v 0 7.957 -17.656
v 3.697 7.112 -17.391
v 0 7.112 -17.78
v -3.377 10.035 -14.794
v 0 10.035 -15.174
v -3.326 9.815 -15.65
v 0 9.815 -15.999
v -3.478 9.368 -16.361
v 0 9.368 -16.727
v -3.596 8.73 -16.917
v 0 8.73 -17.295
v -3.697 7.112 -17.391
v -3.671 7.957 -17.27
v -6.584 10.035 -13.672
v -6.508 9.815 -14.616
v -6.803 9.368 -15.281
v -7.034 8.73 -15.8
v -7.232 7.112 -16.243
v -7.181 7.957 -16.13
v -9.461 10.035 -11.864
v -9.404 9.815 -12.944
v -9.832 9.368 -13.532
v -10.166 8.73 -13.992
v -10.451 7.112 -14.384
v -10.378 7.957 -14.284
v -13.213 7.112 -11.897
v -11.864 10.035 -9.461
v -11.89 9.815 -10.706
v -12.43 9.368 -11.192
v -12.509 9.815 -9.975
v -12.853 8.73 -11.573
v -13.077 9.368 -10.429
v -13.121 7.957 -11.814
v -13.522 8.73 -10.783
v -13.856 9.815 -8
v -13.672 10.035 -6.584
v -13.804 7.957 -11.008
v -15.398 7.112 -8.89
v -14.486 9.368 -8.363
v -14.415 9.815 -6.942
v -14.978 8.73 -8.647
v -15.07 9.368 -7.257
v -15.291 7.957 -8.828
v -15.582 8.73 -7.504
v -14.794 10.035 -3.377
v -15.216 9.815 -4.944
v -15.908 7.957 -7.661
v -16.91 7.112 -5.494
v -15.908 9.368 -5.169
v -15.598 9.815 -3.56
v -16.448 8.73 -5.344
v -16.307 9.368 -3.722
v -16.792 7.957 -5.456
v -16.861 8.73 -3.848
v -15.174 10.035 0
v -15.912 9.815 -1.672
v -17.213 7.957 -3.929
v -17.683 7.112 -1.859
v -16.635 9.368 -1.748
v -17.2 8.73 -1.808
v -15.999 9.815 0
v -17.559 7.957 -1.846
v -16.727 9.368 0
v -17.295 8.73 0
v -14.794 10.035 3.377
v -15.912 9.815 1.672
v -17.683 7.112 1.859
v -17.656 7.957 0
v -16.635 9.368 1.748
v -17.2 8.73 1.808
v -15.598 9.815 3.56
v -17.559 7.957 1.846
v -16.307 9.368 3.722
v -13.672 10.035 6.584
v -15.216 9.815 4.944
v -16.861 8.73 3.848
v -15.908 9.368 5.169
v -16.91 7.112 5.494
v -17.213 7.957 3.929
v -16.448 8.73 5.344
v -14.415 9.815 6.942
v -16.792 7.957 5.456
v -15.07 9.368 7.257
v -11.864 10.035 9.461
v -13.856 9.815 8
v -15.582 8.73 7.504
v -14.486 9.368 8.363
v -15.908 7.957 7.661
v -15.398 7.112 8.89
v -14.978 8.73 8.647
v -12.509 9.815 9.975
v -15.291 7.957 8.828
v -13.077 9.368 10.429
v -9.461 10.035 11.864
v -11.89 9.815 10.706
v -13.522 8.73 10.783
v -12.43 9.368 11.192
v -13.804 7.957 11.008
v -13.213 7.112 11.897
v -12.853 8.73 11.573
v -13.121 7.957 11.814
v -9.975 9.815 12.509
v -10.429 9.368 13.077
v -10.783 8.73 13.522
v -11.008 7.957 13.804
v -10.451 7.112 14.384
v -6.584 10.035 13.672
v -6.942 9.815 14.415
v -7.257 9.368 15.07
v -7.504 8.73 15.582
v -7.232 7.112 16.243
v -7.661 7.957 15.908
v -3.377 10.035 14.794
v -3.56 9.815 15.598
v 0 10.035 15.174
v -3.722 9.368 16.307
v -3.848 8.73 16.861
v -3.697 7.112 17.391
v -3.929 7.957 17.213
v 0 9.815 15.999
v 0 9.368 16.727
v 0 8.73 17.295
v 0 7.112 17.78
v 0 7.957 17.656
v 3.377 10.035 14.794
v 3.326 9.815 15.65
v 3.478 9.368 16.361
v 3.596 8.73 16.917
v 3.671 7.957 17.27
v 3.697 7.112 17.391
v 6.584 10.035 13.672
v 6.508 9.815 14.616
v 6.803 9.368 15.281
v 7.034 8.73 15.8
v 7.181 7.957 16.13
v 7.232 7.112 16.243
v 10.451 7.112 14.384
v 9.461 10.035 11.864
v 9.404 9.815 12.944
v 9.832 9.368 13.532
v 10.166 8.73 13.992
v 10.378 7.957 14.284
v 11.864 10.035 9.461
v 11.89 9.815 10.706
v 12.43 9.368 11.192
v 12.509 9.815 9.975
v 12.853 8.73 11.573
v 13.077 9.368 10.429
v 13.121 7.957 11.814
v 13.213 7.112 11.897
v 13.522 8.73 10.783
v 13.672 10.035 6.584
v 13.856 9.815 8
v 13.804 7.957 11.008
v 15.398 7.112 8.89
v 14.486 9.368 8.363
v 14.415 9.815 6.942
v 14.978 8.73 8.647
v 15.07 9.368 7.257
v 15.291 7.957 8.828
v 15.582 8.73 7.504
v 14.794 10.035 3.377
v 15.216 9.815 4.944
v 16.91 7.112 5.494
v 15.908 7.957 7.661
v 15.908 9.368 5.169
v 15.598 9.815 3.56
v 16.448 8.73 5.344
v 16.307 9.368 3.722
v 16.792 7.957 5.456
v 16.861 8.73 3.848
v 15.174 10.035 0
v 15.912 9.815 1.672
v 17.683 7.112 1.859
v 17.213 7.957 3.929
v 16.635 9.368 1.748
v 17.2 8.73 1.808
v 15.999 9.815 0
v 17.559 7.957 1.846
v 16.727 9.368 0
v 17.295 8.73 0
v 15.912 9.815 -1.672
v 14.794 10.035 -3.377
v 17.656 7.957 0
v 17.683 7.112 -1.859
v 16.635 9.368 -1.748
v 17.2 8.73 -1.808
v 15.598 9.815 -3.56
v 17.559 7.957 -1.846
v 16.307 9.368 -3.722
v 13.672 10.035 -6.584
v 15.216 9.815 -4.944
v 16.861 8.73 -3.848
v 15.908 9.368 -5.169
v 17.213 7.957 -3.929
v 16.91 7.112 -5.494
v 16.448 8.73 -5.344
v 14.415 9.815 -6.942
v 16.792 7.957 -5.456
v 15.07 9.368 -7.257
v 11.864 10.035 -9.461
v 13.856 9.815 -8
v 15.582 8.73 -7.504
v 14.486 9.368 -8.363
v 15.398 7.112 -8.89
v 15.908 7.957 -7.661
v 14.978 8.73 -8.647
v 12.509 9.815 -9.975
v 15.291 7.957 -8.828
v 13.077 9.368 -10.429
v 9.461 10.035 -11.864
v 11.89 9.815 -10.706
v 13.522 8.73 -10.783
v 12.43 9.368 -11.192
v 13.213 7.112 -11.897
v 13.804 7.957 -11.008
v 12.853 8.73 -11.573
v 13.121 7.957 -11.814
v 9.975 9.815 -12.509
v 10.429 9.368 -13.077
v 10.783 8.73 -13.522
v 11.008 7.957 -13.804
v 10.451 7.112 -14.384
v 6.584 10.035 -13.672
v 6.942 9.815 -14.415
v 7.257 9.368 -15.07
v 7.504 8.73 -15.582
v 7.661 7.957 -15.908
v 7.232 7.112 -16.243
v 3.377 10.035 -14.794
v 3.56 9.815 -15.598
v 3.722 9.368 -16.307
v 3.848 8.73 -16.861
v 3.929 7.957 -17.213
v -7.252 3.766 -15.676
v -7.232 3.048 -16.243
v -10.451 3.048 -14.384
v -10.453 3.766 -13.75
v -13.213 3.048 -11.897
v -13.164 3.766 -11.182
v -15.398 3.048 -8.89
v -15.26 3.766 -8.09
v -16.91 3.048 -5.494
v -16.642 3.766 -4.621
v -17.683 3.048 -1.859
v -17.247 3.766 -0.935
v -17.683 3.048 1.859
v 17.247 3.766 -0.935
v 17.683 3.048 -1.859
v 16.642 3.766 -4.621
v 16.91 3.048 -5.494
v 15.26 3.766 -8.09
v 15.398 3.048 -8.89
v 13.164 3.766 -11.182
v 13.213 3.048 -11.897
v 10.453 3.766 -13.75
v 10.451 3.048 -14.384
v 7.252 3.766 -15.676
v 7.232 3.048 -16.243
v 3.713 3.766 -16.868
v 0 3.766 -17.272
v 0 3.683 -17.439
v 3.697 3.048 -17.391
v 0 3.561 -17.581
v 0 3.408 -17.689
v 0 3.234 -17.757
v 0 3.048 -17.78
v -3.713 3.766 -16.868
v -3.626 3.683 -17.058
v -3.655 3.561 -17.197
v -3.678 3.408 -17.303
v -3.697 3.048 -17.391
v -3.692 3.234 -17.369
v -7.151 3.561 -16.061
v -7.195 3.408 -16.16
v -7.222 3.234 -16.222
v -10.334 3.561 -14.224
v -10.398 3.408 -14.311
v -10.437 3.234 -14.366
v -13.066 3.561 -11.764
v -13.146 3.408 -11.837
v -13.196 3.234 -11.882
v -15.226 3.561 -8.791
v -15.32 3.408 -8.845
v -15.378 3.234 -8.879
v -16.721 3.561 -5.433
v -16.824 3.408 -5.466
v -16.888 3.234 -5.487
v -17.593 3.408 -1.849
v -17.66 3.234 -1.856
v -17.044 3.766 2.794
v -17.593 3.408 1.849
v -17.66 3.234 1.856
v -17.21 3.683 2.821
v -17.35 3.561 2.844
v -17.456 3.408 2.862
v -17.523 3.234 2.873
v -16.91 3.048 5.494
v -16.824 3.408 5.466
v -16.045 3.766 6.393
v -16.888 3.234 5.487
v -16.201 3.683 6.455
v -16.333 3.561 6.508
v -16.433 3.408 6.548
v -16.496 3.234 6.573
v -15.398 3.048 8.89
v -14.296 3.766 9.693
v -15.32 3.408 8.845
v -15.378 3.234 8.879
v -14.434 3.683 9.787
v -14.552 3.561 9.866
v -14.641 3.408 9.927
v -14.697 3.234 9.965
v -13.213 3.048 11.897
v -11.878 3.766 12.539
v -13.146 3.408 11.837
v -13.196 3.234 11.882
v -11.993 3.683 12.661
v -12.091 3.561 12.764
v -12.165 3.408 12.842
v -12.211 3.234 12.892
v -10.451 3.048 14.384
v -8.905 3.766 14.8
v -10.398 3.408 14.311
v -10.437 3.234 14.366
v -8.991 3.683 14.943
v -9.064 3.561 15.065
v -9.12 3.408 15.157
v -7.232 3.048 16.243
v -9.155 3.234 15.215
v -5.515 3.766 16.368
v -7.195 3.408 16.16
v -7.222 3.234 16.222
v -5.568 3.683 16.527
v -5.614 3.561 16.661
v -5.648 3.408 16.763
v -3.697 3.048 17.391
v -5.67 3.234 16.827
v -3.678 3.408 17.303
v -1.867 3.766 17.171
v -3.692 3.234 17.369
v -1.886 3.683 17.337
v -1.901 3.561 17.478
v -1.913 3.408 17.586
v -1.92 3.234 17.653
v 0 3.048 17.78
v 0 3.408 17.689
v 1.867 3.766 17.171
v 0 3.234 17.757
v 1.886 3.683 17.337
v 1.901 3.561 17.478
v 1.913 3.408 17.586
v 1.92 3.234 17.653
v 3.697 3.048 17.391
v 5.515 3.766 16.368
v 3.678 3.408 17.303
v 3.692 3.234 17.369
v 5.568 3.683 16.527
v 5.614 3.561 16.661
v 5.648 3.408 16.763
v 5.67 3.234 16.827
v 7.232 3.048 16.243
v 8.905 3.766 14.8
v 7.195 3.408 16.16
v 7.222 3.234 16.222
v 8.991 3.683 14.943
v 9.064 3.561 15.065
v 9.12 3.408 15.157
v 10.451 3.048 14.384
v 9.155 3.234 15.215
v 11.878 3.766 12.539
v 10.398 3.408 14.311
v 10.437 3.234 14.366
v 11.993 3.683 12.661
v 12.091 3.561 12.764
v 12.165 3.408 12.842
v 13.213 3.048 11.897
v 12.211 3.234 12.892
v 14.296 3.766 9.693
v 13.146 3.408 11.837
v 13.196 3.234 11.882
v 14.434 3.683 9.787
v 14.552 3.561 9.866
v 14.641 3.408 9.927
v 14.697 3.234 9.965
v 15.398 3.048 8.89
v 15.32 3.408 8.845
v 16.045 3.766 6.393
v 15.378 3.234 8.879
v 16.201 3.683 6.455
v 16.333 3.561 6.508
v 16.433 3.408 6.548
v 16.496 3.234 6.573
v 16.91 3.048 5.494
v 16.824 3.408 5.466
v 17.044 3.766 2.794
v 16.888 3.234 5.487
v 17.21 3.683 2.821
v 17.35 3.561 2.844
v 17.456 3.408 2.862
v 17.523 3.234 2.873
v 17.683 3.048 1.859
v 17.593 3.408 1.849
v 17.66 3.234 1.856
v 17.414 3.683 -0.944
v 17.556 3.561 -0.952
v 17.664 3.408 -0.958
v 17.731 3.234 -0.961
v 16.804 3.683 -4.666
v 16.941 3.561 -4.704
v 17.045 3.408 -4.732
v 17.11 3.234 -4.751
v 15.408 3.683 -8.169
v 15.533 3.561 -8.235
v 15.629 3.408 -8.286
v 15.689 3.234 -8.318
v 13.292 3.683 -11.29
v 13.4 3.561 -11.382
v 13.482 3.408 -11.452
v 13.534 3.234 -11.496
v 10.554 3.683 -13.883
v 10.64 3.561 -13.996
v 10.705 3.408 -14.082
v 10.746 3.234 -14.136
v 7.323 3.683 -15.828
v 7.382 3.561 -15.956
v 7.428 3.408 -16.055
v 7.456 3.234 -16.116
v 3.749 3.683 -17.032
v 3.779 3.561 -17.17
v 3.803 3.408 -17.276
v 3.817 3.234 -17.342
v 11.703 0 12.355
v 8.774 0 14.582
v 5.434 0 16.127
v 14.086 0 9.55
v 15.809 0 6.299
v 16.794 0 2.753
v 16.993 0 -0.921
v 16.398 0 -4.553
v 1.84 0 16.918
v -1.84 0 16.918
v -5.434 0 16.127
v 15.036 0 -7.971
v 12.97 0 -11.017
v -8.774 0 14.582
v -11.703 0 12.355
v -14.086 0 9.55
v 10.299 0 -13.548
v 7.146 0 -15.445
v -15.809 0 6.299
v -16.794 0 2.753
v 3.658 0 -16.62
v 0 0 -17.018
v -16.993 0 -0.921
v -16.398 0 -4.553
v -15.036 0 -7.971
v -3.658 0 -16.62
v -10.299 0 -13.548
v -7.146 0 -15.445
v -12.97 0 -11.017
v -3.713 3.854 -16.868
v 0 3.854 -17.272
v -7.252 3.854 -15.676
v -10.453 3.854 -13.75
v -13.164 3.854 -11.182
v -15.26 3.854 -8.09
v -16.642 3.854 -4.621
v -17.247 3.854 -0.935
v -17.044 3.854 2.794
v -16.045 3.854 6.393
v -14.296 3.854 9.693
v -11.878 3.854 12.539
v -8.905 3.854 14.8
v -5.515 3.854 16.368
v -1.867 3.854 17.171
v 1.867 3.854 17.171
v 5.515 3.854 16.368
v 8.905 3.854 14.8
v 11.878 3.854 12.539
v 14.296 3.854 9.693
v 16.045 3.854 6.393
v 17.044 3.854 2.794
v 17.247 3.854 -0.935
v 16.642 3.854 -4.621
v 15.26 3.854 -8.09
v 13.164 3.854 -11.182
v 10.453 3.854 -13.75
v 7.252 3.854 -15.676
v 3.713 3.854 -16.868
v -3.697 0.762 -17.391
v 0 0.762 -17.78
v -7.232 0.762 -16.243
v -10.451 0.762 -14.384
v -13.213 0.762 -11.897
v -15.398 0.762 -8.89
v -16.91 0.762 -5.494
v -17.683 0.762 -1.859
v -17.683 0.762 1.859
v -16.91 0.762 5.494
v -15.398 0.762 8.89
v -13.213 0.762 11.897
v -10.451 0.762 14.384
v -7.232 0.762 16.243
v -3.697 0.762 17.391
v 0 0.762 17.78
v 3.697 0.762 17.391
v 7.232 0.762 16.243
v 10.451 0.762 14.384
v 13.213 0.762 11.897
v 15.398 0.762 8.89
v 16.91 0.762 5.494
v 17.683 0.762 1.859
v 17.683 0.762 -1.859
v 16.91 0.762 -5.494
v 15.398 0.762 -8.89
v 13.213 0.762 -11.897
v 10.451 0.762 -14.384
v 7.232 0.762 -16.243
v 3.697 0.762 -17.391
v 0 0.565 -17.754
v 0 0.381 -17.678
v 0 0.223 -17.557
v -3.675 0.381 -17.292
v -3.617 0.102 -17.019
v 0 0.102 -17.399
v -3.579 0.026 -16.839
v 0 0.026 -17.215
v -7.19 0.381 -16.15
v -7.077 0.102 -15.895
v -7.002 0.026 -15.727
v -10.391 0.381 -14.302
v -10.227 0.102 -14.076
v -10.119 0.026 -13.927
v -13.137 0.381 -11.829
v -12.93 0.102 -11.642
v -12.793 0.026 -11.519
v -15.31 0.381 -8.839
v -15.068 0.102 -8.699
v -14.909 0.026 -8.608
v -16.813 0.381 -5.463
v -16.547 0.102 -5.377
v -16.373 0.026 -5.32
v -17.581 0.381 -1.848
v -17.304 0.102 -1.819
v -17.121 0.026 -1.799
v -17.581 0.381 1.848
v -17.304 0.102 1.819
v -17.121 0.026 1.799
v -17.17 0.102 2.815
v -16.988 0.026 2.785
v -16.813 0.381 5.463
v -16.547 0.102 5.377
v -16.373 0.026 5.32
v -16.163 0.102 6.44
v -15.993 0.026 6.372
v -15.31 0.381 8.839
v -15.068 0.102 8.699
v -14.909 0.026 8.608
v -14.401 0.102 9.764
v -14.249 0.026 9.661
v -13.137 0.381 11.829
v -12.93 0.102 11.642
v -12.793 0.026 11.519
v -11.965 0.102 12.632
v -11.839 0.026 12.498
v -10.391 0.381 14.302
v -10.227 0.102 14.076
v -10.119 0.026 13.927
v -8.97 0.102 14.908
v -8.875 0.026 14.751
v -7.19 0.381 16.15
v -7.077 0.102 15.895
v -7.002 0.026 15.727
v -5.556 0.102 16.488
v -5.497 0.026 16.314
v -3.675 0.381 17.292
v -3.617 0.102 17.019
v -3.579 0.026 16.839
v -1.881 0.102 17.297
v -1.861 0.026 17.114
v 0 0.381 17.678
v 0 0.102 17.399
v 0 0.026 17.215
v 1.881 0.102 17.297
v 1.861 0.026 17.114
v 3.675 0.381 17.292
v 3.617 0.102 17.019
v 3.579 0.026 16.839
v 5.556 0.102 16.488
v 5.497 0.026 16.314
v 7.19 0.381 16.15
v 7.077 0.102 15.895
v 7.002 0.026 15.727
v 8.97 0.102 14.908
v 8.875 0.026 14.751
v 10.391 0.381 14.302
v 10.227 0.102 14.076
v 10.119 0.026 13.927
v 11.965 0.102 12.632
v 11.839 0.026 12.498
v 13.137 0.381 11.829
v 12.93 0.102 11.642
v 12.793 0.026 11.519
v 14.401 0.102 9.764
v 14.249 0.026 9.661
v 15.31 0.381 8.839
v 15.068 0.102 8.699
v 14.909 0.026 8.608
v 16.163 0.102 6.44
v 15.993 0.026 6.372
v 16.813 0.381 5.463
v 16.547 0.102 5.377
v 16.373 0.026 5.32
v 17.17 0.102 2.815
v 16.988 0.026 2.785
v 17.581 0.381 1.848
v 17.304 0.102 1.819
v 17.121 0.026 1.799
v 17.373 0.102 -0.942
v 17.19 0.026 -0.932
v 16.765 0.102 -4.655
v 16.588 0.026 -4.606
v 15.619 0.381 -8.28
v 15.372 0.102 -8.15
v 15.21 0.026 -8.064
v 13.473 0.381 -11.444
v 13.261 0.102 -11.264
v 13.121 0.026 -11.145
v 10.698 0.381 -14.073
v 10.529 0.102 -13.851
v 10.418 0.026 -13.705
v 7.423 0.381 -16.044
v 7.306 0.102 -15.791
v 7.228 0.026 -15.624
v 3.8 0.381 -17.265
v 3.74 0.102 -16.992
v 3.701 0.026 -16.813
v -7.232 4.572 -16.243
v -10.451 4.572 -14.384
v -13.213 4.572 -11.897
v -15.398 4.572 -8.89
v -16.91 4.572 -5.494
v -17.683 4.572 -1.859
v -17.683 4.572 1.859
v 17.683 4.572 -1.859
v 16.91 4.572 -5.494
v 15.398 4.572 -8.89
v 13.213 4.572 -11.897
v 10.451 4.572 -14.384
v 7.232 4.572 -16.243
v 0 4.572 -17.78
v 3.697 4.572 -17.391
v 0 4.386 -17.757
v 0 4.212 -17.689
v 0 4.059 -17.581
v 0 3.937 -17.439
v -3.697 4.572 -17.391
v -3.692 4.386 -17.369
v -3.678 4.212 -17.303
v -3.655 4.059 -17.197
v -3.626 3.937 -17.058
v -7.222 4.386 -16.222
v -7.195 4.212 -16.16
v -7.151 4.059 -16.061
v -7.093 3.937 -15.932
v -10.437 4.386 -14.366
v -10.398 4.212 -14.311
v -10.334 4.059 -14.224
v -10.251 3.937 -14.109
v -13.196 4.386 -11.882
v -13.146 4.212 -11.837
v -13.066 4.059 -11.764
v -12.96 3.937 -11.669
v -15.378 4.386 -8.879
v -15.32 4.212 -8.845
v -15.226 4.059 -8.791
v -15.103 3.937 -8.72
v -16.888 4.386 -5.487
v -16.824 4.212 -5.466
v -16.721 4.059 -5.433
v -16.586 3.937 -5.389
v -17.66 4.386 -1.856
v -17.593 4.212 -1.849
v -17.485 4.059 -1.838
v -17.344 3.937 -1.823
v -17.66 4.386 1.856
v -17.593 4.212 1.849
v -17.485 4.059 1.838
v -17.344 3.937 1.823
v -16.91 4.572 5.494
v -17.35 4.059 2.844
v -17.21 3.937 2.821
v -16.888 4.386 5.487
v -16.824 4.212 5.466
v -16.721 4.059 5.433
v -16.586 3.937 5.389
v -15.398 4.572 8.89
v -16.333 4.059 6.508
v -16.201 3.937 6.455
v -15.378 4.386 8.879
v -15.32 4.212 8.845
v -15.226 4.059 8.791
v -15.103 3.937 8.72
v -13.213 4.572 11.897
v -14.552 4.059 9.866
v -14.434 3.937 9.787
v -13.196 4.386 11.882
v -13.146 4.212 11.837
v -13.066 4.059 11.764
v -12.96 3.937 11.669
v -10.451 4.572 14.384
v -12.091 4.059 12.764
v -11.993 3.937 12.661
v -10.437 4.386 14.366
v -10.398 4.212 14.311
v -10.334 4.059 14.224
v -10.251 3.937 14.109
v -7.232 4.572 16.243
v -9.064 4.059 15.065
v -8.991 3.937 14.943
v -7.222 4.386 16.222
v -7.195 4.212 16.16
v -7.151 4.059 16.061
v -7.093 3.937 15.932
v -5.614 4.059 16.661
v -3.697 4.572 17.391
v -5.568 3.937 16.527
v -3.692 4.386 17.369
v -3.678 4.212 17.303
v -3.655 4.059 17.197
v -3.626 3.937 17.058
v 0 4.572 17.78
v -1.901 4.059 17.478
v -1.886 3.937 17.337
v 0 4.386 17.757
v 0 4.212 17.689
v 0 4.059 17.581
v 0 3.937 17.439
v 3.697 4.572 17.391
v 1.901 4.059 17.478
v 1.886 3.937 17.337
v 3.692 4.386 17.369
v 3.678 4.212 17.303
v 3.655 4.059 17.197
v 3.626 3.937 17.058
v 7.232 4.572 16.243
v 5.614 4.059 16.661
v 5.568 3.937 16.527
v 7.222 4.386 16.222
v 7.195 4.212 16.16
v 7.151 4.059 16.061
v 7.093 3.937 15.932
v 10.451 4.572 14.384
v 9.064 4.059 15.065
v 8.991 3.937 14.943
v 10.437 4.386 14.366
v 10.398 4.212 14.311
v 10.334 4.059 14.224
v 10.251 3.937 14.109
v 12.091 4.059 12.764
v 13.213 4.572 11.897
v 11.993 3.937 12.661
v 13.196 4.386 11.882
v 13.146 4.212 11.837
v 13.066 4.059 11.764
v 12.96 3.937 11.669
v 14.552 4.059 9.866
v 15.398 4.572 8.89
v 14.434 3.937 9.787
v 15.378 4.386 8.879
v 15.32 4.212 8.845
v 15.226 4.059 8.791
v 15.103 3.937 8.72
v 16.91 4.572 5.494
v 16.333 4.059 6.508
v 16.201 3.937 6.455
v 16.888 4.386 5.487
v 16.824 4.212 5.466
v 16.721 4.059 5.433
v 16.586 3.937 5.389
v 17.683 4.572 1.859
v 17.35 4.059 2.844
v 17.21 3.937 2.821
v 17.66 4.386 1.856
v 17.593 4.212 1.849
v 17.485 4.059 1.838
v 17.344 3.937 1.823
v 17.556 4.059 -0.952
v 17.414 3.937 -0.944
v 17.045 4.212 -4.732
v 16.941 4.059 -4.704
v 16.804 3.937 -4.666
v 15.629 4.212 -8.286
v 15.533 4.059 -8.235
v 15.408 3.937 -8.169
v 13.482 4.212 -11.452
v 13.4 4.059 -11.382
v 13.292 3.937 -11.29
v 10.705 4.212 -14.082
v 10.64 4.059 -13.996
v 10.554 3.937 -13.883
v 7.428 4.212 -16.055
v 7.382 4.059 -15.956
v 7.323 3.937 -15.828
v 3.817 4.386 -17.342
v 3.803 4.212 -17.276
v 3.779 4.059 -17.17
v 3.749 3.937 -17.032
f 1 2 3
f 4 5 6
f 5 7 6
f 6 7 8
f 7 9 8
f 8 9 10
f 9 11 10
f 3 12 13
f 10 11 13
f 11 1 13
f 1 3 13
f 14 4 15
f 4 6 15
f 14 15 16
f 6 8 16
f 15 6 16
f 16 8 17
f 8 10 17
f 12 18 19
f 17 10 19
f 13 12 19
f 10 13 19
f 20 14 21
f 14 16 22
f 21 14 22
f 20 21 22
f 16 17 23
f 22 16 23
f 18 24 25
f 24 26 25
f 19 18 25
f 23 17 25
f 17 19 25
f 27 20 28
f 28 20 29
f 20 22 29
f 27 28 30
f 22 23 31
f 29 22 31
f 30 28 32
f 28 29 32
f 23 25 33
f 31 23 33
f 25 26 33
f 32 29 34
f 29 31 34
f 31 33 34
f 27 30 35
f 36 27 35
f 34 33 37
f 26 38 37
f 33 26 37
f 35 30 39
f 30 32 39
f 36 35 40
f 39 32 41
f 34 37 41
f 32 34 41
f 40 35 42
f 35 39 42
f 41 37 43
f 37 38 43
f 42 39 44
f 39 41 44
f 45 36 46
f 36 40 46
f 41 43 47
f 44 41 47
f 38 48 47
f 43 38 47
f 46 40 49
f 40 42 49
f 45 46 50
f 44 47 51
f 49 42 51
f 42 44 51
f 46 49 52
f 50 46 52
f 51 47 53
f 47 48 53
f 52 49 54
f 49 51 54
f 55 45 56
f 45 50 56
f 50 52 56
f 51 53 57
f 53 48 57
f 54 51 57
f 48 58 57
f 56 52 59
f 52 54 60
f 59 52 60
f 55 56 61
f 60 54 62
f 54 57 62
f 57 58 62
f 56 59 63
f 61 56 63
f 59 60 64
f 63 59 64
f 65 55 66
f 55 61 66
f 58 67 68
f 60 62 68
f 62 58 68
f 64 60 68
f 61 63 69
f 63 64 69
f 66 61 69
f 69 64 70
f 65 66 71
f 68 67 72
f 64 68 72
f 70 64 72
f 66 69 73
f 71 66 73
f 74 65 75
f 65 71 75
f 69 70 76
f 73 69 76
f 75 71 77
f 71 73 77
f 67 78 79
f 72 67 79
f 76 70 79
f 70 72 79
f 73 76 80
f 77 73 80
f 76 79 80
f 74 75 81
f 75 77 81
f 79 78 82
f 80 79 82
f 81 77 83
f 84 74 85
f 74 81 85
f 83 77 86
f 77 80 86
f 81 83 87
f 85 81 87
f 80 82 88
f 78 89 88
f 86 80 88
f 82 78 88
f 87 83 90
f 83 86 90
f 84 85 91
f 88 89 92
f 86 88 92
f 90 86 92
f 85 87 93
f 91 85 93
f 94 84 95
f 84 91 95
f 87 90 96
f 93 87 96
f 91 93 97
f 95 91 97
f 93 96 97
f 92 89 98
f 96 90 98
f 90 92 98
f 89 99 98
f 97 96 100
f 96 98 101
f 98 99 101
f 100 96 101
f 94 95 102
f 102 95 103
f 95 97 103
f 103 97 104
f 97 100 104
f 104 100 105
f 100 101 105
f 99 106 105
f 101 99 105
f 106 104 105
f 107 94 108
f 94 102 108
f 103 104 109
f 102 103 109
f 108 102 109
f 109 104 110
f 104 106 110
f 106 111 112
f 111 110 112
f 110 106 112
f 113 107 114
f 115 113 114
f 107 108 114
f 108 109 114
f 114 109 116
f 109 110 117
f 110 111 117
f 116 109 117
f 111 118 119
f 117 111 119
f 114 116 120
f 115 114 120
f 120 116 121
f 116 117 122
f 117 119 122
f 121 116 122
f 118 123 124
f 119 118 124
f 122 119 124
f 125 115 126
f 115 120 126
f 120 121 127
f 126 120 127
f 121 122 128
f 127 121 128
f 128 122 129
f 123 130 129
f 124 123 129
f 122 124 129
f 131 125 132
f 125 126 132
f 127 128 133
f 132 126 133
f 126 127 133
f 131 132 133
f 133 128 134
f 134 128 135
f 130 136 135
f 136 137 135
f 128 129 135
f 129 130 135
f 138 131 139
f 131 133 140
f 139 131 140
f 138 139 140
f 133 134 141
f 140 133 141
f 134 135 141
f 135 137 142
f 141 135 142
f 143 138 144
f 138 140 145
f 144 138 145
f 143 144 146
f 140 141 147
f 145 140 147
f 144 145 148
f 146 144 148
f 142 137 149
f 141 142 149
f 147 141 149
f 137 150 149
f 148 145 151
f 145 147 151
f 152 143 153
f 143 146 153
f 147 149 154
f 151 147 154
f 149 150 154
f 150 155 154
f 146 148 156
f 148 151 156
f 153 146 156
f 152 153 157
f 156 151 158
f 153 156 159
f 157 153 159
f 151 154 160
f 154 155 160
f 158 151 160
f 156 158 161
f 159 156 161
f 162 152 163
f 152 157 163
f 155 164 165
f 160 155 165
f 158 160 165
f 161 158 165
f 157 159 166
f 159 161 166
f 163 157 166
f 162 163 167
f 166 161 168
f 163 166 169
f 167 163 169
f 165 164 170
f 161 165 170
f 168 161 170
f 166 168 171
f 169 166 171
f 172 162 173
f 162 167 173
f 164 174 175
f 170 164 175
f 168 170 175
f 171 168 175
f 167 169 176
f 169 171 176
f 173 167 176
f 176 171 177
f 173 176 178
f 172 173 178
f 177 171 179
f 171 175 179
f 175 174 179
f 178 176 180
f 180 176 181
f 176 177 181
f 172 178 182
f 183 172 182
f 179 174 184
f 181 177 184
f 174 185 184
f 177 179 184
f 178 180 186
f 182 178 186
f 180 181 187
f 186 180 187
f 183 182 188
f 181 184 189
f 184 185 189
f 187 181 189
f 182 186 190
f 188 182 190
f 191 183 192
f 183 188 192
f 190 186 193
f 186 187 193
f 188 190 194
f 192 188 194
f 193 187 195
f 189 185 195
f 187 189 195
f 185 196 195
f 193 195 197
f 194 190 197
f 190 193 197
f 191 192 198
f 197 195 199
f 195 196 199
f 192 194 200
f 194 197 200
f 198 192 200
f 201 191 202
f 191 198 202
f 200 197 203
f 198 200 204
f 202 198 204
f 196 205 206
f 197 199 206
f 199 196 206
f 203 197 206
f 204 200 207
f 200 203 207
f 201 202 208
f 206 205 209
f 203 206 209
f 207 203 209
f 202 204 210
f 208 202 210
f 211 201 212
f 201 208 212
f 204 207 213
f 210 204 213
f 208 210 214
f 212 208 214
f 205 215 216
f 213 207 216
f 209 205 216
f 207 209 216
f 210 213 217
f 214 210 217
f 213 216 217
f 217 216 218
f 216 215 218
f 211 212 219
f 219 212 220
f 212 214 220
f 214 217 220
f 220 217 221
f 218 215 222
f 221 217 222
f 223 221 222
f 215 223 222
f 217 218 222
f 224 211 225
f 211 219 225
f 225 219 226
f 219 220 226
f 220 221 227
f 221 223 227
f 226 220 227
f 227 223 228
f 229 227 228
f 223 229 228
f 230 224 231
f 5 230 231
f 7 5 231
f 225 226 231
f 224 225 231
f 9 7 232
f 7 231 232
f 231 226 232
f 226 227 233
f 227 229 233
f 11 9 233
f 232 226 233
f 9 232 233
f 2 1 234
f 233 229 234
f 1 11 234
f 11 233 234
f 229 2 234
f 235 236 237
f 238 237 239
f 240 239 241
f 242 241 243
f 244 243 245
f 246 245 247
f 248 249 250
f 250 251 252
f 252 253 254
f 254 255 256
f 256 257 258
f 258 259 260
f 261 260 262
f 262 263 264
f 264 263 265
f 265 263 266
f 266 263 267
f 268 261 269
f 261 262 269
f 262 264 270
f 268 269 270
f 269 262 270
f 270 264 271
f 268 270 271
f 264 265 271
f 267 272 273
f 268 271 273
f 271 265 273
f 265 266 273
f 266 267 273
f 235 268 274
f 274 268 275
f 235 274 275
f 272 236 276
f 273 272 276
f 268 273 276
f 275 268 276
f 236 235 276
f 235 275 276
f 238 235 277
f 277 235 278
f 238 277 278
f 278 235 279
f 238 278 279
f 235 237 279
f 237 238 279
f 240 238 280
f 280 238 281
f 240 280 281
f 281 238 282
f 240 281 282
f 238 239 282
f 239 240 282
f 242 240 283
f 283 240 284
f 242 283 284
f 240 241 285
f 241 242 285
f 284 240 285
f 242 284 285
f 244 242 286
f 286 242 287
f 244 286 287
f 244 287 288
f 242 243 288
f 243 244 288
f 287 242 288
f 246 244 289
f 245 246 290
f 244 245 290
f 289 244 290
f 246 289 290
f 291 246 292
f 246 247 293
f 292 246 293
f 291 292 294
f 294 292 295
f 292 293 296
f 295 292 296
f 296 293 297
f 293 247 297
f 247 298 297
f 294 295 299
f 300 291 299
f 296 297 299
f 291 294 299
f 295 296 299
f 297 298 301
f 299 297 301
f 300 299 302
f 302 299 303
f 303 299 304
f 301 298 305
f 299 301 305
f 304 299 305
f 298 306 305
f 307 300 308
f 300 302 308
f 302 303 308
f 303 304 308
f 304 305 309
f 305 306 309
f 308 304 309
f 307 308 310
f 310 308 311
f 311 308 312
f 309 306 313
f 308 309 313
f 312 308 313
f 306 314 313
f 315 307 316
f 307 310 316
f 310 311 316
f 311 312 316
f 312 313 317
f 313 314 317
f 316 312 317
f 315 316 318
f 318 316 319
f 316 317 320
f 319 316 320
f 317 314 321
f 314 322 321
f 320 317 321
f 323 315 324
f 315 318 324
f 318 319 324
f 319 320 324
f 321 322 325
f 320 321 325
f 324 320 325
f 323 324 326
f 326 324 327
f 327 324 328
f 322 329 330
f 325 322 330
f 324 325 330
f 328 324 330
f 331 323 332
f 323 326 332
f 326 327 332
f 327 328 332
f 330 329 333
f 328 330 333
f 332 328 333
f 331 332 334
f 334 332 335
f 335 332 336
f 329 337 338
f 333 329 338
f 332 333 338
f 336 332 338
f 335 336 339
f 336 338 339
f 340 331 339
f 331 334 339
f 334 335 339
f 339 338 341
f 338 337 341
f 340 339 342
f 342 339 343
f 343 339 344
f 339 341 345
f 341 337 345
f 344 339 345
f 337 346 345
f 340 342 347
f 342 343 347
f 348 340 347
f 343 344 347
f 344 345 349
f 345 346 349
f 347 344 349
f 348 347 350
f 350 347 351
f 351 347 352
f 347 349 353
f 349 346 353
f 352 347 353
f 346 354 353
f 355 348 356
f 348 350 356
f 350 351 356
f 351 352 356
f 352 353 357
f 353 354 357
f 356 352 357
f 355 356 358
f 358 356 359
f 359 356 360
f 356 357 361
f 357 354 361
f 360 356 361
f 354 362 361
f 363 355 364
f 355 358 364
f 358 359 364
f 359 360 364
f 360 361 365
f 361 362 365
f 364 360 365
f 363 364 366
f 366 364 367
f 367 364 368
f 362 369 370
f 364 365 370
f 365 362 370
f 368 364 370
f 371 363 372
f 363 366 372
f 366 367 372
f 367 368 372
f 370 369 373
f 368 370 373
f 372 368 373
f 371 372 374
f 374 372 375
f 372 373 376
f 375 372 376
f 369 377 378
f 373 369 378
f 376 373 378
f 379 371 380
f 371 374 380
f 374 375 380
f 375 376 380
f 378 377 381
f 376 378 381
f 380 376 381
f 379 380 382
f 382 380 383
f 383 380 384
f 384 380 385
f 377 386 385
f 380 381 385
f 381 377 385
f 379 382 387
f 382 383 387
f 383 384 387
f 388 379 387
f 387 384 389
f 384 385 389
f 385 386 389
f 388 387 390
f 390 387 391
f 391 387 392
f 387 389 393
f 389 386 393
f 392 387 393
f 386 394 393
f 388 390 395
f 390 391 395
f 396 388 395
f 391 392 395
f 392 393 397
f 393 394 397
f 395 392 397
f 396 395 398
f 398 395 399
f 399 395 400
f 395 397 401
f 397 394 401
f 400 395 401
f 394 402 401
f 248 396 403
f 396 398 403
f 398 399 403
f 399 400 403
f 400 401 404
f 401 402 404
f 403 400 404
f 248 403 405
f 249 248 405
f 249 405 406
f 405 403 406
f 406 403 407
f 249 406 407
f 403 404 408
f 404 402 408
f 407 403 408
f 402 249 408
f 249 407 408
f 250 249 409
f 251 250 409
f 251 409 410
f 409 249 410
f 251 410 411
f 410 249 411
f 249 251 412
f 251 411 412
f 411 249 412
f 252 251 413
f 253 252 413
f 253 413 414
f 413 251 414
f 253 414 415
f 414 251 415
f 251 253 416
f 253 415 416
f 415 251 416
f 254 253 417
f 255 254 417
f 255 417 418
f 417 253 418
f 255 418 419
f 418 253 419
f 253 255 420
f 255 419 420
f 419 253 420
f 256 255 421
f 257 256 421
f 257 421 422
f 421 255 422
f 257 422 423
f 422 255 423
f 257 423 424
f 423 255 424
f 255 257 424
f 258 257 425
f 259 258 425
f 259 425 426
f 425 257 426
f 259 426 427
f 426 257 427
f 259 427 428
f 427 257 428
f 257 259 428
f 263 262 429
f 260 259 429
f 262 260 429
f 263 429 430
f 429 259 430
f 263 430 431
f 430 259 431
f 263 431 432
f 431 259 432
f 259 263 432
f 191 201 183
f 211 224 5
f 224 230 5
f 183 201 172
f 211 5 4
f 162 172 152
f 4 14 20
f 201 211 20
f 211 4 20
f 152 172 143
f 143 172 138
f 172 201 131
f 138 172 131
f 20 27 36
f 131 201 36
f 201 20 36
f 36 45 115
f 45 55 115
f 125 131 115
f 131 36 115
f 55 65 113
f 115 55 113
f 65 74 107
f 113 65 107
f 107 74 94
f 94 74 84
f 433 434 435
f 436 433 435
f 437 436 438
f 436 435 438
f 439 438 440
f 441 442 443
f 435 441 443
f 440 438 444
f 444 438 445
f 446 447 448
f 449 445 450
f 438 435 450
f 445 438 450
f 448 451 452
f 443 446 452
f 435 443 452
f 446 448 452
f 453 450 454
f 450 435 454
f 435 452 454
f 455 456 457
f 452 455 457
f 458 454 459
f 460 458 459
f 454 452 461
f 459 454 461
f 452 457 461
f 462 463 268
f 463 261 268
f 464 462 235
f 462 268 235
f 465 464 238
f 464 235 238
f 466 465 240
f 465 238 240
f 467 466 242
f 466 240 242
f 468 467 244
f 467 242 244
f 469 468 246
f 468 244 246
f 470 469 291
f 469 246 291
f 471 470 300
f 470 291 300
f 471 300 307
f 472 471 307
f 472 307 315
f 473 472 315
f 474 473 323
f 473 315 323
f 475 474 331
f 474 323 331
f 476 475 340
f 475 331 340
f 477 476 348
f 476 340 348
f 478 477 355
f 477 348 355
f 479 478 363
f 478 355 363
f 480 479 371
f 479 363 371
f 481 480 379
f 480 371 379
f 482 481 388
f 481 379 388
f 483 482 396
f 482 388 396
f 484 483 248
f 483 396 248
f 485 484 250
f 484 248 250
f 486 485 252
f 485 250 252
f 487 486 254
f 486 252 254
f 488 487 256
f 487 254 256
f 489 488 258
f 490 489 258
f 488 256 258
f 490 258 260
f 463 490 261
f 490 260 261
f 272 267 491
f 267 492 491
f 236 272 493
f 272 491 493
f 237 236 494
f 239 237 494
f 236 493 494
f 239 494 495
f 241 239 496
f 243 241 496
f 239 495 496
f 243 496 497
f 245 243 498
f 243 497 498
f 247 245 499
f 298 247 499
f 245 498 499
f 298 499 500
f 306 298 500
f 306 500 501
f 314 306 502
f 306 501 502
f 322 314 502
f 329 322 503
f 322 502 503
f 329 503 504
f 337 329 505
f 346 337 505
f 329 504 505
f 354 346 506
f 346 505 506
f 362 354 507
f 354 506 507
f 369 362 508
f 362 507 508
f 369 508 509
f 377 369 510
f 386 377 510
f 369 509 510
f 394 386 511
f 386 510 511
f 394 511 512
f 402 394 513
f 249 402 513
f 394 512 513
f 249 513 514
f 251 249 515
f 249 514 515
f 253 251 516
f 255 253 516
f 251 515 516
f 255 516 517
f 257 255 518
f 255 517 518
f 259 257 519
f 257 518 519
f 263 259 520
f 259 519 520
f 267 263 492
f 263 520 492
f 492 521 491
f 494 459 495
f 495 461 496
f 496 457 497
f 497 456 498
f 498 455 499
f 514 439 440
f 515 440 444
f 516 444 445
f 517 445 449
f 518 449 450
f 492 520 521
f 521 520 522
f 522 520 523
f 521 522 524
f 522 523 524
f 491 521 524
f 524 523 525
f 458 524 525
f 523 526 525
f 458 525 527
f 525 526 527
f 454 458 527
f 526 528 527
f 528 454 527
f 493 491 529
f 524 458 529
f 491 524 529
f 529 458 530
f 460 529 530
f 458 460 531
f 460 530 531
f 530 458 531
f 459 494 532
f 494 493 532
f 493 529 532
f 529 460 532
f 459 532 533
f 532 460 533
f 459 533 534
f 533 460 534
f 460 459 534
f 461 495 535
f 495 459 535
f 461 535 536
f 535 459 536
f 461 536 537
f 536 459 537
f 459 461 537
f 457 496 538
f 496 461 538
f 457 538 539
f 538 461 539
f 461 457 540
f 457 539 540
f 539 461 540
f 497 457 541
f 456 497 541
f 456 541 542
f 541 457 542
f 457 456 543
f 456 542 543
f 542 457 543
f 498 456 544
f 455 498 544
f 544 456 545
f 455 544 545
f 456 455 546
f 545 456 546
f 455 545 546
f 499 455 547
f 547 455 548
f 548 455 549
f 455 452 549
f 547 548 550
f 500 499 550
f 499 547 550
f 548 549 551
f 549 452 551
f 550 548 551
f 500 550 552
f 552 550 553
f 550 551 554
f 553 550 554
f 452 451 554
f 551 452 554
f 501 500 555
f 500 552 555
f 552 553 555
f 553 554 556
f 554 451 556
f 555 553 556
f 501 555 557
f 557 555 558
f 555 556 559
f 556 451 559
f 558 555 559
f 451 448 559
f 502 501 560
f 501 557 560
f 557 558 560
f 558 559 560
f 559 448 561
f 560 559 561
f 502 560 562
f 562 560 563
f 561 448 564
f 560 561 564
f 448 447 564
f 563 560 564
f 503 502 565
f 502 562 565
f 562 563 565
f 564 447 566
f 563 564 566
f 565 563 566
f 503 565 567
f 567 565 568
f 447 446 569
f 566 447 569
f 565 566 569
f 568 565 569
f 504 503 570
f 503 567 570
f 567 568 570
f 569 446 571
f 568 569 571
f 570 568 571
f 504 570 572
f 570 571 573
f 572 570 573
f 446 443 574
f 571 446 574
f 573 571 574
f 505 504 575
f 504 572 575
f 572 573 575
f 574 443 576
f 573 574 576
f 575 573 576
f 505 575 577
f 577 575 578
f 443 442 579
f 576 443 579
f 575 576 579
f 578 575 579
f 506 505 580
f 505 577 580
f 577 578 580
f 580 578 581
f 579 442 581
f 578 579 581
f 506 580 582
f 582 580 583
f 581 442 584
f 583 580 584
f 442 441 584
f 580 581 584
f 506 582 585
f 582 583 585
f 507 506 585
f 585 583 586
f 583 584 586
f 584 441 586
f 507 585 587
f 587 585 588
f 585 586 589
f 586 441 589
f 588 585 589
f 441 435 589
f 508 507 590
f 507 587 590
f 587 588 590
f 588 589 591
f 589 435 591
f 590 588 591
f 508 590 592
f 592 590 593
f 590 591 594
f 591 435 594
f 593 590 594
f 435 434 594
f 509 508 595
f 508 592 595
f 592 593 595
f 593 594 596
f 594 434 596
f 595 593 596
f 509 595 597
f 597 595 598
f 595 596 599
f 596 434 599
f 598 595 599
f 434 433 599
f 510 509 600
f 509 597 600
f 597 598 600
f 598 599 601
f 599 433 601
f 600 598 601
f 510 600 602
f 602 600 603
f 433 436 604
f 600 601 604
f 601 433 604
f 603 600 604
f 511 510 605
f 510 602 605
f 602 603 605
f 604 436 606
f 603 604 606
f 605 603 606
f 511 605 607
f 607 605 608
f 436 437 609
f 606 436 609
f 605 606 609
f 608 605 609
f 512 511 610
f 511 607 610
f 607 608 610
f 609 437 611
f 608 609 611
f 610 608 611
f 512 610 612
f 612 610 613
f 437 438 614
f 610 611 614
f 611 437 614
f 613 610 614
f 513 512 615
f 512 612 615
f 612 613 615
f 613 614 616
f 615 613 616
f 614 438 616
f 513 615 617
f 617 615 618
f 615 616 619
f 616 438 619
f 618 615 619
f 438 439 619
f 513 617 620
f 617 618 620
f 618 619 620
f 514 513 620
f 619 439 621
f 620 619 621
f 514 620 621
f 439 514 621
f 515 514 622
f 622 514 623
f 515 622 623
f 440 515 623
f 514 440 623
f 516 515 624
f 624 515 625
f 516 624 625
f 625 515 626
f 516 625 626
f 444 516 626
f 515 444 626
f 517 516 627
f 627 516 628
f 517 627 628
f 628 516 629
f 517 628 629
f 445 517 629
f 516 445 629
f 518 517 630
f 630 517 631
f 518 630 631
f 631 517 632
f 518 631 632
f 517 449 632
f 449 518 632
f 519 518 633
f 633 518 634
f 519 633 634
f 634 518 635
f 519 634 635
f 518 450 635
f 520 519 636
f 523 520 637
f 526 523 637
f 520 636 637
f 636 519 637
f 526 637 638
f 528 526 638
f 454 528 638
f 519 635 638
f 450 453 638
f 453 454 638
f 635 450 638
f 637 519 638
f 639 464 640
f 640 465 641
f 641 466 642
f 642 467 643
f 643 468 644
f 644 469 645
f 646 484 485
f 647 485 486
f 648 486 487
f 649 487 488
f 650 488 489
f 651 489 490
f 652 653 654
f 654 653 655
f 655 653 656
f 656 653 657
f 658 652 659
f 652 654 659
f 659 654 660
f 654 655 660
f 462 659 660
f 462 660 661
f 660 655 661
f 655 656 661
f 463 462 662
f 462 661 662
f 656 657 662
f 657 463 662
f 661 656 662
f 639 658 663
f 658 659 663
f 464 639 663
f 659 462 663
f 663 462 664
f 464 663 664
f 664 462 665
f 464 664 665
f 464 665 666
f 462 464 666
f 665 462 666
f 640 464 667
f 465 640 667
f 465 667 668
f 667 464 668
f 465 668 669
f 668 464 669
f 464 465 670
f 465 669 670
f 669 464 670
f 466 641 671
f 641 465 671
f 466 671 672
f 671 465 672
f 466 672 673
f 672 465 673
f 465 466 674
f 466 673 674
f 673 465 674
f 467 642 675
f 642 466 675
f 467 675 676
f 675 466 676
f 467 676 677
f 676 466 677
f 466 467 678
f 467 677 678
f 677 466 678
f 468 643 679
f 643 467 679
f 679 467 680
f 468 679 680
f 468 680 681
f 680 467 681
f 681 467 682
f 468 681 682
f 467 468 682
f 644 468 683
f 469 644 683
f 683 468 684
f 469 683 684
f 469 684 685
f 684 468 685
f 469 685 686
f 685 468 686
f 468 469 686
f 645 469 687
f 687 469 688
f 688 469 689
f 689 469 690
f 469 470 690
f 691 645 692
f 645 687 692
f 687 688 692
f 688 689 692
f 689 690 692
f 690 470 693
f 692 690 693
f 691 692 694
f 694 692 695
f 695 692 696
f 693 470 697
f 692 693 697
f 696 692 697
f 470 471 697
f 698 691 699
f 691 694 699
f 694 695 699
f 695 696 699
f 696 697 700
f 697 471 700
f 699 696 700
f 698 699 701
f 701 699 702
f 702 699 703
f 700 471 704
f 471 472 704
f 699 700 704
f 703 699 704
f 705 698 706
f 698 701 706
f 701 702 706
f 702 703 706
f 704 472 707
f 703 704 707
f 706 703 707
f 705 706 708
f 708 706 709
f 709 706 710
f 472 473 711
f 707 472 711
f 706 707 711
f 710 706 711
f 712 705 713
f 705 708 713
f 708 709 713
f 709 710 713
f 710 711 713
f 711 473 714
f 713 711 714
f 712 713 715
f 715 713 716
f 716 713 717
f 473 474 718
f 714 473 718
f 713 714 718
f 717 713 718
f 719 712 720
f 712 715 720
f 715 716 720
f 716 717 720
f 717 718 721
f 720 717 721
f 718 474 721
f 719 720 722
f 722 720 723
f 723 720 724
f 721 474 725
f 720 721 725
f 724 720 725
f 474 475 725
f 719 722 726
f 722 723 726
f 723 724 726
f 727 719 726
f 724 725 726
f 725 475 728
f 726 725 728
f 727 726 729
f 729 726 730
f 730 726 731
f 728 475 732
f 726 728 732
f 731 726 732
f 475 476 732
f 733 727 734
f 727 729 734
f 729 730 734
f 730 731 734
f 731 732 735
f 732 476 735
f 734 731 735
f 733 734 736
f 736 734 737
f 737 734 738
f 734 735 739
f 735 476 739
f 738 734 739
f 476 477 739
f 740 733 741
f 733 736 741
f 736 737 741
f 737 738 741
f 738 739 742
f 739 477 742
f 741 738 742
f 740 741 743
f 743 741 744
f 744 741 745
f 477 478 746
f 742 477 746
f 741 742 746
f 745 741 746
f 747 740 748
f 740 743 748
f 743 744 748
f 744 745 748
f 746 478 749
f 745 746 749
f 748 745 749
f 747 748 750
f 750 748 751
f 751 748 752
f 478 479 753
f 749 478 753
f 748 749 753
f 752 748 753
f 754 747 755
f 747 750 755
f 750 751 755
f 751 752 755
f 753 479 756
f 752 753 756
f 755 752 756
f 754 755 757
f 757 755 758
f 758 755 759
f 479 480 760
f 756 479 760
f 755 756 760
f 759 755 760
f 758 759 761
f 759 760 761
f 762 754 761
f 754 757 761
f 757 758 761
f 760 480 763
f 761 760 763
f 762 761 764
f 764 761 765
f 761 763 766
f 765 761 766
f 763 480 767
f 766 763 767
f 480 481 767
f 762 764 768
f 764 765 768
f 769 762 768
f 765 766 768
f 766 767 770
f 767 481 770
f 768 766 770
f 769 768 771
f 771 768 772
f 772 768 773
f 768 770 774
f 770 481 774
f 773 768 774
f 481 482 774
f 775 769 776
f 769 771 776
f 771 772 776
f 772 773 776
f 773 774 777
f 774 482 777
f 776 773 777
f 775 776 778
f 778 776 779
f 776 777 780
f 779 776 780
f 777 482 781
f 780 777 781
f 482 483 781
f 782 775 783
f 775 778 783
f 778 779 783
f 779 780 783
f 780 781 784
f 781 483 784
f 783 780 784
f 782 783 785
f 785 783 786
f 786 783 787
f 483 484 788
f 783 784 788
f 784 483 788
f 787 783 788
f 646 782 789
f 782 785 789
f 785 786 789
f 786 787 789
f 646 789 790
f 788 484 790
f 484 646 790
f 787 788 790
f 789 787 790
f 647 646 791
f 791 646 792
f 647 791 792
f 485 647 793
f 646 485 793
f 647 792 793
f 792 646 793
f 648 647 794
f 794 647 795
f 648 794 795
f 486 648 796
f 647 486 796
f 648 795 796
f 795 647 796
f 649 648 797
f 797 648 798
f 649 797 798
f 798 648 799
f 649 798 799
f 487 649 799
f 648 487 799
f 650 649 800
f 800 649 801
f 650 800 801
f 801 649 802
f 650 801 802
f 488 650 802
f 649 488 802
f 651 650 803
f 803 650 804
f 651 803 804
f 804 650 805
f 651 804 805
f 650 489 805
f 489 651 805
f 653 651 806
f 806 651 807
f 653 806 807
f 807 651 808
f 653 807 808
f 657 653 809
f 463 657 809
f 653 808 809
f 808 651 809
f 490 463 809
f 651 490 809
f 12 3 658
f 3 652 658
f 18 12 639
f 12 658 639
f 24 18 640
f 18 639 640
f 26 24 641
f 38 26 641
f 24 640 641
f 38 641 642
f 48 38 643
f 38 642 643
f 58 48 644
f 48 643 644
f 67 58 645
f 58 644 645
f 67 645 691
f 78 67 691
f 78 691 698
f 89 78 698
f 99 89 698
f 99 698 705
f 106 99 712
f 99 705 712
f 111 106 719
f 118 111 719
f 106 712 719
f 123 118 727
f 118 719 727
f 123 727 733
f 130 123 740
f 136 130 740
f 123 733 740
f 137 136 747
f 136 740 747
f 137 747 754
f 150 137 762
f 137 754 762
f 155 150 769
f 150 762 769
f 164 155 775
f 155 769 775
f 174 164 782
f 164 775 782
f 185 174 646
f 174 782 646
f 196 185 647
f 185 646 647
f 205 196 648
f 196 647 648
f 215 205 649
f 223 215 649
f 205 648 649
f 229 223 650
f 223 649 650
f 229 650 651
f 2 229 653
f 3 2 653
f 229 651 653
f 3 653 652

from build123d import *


with BuildPart() as part:
    # Sketch2 → Revolve2 (revolve)
    with BuildSketch(Plane.XY, mode=Mode.PRIVATE) as revolve2_sk:
        with BuildLine():
            Line((0, 0), (0, 10.034926072))
            Line((0, 10.034926072), (-15.174290575, 10.034926072))
            ThreePointArc((-15.174290575, 10.034926072), (-17.033998604, 9.069882685), (-17.78, 7.112))
            Line((-17.78, 7.112), (-17.78, 4.572))
            ThreePointArc((-17.78, 4.572), (-17.640170395, 4.132059095), (-17.272, 3.85357951))
            Line((-17.272, 3.85357951), (-17.272, 3.76642049))
            ThreePointArc((-17.272, 3.76642049), (-17.640170395, 3.487940905), (-17.78, 3.048))
            Line((-17.78, 3.048), (-17.78, 0.762))
            ThreePointArc((-17.78, 0.762), (-17.556815367, 0.223184633), (-17.018, 0))
            Line((-17.018, 0), (0, 0))
        make_face()
    revolve(revolve2_sk.sketch.rotate(Axis((0, 0, 0), (0, 1, 0)), 270), axis=Axis((0, 0, 0), (0, 1, 0)))


solid = part.part
